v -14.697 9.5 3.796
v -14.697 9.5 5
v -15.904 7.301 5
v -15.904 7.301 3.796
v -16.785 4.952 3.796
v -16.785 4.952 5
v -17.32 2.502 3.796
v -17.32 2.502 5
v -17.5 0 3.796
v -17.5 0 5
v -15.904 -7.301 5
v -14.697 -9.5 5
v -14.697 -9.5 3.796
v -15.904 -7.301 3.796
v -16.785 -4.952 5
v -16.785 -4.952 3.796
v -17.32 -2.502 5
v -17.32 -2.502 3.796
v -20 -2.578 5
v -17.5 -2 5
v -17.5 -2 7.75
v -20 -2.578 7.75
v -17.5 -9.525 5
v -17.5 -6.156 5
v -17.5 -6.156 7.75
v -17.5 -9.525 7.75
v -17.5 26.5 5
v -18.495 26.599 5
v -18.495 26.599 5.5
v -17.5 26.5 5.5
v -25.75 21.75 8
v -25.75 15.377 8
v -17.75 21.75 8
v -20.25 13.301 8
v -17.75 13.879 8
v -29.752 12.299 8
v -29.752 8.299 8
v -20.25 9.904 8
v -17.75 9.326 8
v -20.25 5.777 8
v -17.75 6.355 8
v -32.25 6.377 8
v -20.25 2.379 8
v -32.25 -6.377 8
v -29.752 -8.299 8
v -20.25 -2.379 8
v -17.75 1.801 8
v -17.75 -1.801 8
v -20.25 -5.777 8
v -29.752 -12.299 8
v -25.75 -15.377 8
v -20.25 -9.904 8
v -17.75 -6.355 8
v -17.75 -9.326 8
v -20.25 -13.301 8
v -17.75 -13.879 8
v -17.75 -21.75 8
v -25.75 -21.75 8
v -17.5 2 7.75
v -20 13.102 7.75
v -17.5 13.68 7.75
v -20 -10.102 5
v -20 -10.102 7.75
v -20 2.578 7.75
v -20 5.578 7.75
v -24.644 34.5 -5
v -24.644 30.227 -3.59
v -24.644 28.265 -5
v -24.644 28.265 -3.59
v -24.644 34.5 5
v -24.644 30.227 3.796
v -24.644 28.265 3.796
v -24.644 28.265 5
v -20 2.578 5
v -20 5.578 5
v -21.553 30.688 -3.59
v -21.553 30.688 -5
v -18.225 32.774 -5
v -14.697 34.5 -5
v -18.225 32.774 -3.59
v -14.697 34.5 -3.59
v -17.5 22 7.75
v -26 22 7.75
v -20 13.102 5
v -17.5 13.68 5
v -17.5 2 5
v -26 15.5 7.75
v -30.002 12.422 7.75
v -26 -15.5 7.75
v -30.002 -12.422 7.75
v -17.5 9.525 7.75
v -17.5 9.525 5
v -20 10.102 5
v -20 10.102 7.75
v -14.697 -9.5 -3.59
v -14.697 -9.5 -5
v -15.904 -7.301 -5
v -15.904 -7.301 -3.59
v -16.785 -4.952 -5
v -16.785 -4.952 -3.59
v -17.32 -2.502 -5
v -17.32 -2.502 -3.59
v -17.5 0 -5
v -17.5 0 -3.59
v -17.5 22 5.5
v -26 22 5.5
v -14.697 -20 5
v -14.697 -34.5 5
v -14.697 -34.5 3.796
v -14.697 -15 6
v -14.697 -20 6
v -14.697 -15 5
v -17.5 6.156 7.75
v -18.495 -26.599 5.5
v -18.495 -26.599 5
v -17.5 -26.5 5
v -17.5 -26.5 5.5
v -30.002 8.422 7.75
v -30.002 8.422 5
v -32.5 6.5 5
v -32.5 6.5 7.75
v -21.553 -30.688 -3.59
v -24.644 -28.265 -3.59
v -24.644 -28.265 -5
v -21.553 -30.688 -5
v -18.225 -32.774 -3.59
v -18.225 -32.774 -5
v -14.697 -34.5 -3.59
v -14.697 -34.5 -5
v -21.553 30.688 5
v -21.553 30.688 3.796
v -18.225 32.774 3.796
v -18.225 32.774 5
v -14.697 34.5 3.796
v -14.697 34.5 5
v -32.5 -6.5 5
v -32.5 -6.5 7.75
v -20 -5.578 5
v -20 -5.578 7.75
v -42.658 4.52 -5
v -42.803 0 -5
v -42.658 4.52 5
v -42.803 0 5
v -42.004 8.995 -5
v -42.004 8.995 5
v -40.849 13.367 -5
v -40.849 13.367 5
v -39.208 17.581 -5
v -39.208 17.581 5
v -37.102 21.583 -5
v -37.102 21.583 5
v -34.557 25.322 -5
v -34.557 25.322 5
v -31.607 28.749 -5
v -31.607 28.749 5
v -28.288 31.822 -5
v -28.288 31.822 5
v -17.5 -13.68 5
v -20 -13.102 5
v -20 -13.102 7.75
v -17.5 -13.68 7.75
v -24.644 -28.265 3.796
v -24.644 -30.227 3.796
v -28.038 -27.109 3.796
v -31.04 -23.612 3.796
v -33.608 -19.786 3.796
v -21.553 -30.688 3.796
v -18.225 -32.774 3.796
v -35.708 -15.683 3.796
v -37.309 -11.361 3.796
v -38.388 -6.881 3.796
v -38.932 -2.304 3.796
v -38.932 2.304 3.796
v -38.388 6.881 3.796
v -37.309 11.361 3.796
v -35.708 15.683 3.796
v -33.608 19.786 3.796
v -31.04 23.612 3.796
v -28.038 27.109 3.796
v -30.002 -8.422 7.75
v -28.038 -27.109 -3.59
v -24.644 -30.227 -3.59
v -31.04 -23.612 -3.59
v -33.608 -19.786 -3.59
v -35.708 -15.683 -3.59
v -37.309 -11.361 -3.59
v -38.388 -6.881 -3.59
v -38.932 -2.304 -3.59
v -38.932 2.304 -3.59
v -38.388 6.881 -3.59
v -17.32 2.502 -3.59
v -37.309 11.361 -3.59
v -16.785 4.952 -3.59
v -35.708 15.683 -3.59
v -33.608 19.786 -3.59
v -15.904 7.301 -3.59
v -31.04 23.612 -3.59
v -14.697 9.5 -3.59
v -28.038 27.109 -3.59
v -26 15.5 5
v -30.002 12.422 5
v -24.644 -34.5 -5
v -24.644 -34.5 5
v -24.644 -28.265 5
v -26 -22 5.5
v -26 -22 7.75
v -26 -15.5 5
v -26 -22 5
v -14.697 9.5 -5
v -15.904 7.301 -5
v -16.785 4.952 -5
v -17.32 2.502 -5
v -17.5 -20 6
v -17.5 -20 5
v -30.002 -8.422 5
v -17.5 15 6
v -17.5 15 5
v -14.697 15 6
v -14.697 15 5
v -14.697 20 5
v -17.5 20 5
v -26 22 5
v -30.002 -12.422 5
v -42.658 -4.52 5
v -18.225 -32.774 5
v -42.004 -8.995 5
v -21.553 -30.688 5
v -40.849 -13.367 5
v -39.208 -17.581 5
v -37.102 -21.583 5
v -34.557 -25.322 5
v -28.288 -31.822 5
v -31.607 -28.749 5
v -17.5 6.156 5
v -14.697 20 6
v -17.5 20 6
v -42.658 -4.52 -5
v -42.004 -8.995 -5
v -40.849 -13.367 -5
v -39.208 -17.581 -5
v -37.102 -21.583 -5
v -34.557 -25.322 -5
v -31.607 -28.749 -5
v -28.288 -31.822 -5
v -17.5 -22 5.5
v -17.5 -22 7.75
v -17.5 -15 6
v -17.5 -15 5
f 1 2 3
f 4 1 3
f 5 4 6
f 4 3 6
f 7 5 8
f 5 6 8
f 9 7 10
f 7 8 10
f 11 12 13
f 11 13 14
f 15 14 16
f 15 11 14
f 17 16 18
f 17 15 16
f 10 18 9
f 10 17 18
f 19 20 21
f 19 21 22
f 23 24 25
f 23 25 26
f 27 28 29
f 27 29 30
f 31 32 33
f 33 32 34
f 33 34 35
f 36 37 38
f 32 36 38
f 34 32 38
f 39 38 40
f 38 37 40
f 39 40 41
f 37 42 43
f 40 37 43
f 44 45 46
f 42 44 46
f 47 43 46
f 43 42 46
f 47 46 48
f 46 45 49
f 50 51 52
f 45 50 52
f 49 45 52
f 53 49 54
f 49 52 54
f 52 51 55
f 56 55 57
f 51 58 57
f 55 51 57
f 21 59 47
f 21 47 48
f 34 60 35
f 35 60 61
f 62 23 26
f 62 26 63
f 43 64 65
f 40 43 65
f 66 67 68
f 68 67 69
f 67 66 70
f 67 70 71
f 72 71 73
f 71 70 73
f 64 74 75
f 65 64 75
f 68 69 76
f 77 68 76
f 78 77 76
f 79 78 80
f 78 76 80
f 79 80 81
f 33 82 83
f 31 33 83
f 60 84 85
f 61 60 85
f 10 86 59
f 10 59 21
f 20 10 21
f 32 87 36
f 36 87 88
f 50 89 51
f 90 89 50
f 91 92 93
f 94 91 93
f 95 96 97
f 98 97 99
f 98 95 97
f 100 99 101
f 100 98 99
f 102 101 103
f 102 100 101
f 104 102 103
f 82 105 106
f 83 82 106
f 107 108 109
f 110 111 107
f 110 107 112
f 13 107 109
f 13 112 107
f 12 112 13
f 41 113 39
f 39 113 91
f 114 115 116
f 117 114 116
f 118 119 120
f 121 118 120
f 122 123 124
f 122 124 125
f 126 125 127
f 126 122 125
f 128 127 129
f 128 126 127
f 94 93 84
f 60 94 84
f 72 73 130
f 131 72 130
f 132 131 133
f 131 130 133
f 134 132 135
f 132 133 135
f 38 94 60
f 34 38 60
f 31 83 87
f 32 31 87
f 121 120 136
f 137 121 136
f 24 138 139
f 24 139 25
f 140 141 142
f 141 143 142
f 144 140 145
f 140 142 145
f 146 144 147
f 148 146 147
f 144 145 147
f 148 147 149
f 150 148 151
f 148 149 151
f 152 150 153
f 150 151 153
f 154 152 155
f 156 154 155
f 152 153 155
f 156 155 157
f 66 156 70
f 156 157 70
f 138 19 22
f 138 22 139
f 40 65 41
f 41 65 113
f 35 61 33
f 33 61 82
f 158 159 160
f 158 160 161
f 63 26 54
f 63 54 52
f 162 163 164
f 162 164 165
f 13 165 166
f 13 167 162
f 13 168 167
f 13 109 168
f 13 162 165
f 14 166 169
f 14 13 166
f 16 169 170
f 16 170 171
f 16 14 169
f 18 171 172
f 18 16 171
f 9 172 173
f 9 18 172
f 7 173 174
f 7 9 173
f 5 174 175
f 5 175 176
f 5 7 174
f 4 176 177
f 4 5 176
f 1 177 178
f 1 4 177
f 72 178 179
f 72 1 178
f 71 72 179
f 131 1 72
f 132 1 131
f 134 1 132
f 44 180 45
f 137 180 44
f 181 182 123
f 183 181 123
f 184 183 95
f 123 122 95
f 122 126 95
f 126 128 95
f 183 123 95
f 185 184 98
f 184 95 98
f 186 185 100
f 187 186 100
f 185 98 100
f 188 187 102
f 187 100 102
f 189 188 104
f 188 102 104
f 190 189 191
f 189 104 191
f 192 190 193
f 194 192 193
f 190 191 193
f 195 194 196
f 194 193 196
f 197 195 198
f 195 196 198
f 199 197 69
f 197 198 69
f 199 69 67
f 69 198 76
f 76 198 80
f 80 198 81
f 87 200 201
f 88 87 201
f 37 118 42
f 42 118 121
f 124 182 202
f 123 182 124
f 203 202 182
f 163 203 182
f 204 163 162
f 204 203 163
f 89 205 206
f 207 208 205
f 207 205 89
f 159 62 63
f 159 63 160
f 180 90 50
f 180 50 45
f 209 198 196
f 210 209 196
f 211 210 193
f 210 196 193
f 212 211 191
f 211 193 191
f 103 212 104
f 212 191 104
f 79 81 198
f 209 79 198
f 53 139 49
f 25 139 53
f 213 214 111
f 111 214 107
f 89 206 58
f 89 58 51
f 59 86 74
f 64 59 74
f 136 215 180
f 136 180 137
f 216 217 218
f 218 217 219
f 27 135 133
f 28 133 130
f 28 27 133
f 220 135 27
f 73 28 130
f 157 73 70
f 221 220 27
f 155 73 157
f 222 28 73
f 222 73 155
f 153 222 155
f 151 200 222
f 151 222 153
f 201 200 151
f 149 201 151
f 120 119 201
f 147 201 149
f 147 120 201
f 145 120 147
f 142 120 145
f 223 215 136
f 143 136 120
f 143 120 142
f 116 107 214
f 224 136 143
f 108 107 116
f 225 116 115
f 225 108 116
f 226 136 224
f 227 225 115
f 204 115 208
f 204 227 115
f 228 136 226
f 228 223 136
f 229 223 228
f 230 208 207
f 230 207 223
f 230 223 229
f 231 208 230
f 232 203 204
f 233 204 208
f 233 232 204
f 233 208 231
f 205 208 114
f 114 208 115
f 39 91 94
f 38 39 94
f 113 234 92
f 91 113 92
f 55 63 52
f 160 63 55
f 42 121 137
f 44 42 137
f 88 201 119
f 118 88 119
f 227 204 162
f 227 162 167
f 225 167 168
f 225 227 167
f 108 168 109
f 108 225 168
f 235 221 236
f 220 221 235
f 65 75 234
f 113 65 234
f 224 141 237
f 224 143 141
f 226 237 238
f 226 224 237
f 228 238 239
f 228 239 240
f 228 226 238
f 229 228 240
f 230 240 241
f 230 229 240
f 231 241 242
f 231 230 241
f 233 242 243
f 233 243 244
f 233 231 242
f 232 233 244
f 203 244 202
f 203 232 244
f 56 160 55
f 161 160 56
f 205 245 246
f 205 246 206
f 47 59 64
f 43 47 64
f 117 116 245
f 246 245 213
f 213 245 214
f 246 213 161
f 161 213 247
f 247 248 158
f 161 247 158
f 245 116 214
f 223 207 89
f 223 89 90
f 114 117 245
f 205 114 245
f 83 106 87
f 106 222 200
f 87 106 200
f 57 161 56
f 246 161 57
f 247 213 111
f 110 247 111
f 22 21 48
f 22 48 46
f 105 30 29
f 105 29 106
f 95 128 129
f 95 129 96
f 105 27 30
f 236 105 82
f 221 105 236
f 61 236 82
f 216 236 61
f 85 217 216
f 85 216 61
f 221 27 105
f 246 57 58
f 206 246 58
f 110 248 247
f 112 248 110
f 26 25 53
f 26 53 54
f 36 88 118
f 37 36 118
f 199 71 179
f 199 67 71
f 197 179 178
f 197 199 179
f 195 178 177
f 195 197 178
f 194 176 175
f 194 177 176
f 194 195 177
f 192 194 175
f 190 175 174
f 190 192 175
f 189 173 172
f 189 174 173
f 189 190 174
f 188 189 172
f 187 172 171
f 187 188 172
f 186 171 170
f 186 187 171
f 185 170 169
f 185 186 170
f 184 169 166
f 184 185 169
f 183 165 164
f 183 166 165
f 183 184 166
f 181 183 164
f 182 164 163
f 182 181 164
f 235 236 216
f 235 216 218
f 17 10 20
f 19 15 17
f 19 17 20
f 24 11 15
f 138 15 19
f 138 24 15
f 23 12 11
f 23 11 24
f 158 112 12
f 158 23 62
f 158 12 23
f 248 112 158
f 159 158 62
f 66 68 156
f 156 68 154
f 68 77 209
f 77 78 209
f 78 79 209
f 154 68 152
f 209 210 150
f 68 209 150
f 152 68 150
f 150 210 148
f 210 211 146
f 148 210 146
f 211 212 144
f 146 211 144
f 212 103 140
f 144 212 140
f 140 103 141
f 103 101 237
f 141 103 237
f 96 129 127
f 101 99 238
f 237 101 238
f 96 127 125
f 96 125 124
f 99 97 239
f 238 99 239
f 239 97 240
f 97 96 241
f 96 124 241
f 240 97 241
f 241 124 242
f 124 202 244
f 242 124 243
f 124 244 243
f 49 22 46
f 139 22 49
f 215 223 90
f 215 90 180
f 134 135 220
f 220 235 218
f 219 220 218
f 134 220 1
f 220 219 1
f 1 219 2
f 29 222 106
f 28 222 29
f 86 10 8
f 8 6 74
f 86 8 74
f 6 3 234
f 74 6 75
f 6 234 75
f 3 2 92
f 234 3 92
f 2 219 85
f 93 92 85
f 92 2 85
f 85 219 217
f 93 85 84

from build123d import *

# Parameters (mm, degrees)
BOSS_EXTRUDE1_DEPTH = 5
BOSS_EXTRUDE2_DEPTH = 3
SKETCH3_W           = 2.803061543
SKETCH3_H           = 5
BOSS_EXTRUDE3_DEPTH = 1
BOSS_EXTRUDE4_DEPTH = 0.5
SKETCH5_W           = 7.386047788
SKETCH5_H           = 39
CHAMFER2_SIZE       = 0.25


with BuildPart() as part:
    # Sketch1 → Boss-Extrude1 (new body, symmetric)
    with BuildSketch(Plane.XY):
        with BuildLine():
            Line((-14.696938457, 34.5), (-14.696938457, 9.5))
            ThreePointArc((-14.696938457, 9.5), (-16.784612343, 4.952452777), (-17.5, 0))
            Line((-17.5, 0), (-42.802853896, 0))
            ThreePointArc((-42.802853896, 0), (-38.211284713, 19.612097715), (-24.644146108, 34.5))
            Line((-24.644146108, 34.5), (-24.644146108, 28.265103266))
            ThreePointArc((-24.644146108, 28.265103266), (-19.916041725, 31.774223547), (-14.696938457, 34.5))
        make_face()
    boss_extrude1 = extrude(amount=BOSS_EXTRUDE1_DEPTH, both=True)

    # Sketch2 → Boss-Extrude2 (add)
    with BuildSketch(Plane.XY.offset(5)):
        Polygon((-26, 0), (-17.5, 0), (-17.5, 2), (-20, 2.577874668), (-20, 5.577874668), (-17.5, 6.155749336), (-17.5, 9.524542718), (-20, 10.102417386), (-20, 13.102417386), (-17.5, 13.680292054), (-17.5, 15), (-17.5, 22), (-26, 22), (-26, 15.5), (-30.001513248, 12.421912886), (-30.001513248, 8.421912886), (-32.5, 6.5), (-32.5, 0), align=None)
    boss_extrude2 = extrude(amount=BOSS_EXTRUDE2_DEPTH)

    # Sketch3 → Boss-Extrude3 (add)
    with BuildSketch(Plane.XY.offset(5)):
        with Locations((-16.098469229, 17.5)):
            Rectangle(SKETCH3_W, SKETCH3_H)
    boss_extrude3 = extrude(amount=BOSS_EXTRUDE3_DEPTH)

    # Sketch4 → Boss-Extrude4 (add)
    with BuildSketch(Plane.XY.offset(5)):
        Polygon((-26, 22), (-18.495062021, 26.599255094), (-17.5, 26.5), (-17.5, 22), align=None)
    boss_extrude4 = extrude(amount=BOSS_EXTRUDE4_DEPTH)

    # Sketch5 → Cut-Revolve1 (revolve, cut)
    with BuildSketch(Plane(origin=(0, 0, 0), x_dir=(0, 0, -1), z_dir=(1, 0, 0))):
        with Locations((-0.102834864, 19.5)):
            Rectangle(SKETCH5_W, SKETCH5_H)
    cut_revolve1 = revolve(axis=Axis((0, 0, 3.795858758), (0, 0, -1)), mode=Mode.SUBTRACT)

    # Mirror1: Boss-Extrude1, Boss-Extrude2, Boss-Extrude3, Boss-Extrude4, Cut-Revolve1 across plane
    add(boss_extrude1.mirror(Plane.ZX))
    add(boss_extrude2.mirror(Plane.ZX))
    add(boss_extrude3.mirror(Plane.ZX))
    add(boss_extrude4.mirror(Plane.ZX))
    add(cut_revolve1.mirror(Plane.ZX), mode=Mode.SUBTRACT)

    # Chamfer2
    chamfer2_edges = [part.edges().sort_by_distance(p)[0] for p in [
        (-20, -11.602417386, 8),
        (-18.75, -9.813480052, 8),
        (-17.5, -7.840146027, 8),
        (-18.75, -5.866812002, 8),
        (-31.250756624, -7.460956443, 8),
        (-30.001513248, -10.421912886, 8),
        (-28.000756624, -13.960956443, 8),
        (-21.75, -22, 8),
        (-18.75, -13.39135472, 8),
        (-20, -4.077874668, 8),
        (-18.75, -2.288937334, 8),
        (-26, -18.75, 8),
        (-17.5, -17.840146027, 8),
        (-17.5, 17.840146027, 8),
        (-26, 18.75, 8),
        (-18.75, 2.288937334, 8),
        (-20, 4.077874668, 8),
        (-20, 11.602417386, 8),
        (-18.75, 13.39135472, 8),
        (-21.75, 22, 8),
        (-28.000756624, 13.960956443, 8),
        (-30.001513248, 10.421912886, 8),
        (-31.250756624, 7.460956443, 8),
        (-32.5, 0, 8),
        (-17.5, 0, 8),
        (-18.75, 5.866812002, 8),
        (-17.5, 7.840146027, 8),
        (-18.75, 9.813480052, 8),
    ]]
    chamfer(chamfer2_edges, length=CHAMFER2_SIZE)


solid = part.part
